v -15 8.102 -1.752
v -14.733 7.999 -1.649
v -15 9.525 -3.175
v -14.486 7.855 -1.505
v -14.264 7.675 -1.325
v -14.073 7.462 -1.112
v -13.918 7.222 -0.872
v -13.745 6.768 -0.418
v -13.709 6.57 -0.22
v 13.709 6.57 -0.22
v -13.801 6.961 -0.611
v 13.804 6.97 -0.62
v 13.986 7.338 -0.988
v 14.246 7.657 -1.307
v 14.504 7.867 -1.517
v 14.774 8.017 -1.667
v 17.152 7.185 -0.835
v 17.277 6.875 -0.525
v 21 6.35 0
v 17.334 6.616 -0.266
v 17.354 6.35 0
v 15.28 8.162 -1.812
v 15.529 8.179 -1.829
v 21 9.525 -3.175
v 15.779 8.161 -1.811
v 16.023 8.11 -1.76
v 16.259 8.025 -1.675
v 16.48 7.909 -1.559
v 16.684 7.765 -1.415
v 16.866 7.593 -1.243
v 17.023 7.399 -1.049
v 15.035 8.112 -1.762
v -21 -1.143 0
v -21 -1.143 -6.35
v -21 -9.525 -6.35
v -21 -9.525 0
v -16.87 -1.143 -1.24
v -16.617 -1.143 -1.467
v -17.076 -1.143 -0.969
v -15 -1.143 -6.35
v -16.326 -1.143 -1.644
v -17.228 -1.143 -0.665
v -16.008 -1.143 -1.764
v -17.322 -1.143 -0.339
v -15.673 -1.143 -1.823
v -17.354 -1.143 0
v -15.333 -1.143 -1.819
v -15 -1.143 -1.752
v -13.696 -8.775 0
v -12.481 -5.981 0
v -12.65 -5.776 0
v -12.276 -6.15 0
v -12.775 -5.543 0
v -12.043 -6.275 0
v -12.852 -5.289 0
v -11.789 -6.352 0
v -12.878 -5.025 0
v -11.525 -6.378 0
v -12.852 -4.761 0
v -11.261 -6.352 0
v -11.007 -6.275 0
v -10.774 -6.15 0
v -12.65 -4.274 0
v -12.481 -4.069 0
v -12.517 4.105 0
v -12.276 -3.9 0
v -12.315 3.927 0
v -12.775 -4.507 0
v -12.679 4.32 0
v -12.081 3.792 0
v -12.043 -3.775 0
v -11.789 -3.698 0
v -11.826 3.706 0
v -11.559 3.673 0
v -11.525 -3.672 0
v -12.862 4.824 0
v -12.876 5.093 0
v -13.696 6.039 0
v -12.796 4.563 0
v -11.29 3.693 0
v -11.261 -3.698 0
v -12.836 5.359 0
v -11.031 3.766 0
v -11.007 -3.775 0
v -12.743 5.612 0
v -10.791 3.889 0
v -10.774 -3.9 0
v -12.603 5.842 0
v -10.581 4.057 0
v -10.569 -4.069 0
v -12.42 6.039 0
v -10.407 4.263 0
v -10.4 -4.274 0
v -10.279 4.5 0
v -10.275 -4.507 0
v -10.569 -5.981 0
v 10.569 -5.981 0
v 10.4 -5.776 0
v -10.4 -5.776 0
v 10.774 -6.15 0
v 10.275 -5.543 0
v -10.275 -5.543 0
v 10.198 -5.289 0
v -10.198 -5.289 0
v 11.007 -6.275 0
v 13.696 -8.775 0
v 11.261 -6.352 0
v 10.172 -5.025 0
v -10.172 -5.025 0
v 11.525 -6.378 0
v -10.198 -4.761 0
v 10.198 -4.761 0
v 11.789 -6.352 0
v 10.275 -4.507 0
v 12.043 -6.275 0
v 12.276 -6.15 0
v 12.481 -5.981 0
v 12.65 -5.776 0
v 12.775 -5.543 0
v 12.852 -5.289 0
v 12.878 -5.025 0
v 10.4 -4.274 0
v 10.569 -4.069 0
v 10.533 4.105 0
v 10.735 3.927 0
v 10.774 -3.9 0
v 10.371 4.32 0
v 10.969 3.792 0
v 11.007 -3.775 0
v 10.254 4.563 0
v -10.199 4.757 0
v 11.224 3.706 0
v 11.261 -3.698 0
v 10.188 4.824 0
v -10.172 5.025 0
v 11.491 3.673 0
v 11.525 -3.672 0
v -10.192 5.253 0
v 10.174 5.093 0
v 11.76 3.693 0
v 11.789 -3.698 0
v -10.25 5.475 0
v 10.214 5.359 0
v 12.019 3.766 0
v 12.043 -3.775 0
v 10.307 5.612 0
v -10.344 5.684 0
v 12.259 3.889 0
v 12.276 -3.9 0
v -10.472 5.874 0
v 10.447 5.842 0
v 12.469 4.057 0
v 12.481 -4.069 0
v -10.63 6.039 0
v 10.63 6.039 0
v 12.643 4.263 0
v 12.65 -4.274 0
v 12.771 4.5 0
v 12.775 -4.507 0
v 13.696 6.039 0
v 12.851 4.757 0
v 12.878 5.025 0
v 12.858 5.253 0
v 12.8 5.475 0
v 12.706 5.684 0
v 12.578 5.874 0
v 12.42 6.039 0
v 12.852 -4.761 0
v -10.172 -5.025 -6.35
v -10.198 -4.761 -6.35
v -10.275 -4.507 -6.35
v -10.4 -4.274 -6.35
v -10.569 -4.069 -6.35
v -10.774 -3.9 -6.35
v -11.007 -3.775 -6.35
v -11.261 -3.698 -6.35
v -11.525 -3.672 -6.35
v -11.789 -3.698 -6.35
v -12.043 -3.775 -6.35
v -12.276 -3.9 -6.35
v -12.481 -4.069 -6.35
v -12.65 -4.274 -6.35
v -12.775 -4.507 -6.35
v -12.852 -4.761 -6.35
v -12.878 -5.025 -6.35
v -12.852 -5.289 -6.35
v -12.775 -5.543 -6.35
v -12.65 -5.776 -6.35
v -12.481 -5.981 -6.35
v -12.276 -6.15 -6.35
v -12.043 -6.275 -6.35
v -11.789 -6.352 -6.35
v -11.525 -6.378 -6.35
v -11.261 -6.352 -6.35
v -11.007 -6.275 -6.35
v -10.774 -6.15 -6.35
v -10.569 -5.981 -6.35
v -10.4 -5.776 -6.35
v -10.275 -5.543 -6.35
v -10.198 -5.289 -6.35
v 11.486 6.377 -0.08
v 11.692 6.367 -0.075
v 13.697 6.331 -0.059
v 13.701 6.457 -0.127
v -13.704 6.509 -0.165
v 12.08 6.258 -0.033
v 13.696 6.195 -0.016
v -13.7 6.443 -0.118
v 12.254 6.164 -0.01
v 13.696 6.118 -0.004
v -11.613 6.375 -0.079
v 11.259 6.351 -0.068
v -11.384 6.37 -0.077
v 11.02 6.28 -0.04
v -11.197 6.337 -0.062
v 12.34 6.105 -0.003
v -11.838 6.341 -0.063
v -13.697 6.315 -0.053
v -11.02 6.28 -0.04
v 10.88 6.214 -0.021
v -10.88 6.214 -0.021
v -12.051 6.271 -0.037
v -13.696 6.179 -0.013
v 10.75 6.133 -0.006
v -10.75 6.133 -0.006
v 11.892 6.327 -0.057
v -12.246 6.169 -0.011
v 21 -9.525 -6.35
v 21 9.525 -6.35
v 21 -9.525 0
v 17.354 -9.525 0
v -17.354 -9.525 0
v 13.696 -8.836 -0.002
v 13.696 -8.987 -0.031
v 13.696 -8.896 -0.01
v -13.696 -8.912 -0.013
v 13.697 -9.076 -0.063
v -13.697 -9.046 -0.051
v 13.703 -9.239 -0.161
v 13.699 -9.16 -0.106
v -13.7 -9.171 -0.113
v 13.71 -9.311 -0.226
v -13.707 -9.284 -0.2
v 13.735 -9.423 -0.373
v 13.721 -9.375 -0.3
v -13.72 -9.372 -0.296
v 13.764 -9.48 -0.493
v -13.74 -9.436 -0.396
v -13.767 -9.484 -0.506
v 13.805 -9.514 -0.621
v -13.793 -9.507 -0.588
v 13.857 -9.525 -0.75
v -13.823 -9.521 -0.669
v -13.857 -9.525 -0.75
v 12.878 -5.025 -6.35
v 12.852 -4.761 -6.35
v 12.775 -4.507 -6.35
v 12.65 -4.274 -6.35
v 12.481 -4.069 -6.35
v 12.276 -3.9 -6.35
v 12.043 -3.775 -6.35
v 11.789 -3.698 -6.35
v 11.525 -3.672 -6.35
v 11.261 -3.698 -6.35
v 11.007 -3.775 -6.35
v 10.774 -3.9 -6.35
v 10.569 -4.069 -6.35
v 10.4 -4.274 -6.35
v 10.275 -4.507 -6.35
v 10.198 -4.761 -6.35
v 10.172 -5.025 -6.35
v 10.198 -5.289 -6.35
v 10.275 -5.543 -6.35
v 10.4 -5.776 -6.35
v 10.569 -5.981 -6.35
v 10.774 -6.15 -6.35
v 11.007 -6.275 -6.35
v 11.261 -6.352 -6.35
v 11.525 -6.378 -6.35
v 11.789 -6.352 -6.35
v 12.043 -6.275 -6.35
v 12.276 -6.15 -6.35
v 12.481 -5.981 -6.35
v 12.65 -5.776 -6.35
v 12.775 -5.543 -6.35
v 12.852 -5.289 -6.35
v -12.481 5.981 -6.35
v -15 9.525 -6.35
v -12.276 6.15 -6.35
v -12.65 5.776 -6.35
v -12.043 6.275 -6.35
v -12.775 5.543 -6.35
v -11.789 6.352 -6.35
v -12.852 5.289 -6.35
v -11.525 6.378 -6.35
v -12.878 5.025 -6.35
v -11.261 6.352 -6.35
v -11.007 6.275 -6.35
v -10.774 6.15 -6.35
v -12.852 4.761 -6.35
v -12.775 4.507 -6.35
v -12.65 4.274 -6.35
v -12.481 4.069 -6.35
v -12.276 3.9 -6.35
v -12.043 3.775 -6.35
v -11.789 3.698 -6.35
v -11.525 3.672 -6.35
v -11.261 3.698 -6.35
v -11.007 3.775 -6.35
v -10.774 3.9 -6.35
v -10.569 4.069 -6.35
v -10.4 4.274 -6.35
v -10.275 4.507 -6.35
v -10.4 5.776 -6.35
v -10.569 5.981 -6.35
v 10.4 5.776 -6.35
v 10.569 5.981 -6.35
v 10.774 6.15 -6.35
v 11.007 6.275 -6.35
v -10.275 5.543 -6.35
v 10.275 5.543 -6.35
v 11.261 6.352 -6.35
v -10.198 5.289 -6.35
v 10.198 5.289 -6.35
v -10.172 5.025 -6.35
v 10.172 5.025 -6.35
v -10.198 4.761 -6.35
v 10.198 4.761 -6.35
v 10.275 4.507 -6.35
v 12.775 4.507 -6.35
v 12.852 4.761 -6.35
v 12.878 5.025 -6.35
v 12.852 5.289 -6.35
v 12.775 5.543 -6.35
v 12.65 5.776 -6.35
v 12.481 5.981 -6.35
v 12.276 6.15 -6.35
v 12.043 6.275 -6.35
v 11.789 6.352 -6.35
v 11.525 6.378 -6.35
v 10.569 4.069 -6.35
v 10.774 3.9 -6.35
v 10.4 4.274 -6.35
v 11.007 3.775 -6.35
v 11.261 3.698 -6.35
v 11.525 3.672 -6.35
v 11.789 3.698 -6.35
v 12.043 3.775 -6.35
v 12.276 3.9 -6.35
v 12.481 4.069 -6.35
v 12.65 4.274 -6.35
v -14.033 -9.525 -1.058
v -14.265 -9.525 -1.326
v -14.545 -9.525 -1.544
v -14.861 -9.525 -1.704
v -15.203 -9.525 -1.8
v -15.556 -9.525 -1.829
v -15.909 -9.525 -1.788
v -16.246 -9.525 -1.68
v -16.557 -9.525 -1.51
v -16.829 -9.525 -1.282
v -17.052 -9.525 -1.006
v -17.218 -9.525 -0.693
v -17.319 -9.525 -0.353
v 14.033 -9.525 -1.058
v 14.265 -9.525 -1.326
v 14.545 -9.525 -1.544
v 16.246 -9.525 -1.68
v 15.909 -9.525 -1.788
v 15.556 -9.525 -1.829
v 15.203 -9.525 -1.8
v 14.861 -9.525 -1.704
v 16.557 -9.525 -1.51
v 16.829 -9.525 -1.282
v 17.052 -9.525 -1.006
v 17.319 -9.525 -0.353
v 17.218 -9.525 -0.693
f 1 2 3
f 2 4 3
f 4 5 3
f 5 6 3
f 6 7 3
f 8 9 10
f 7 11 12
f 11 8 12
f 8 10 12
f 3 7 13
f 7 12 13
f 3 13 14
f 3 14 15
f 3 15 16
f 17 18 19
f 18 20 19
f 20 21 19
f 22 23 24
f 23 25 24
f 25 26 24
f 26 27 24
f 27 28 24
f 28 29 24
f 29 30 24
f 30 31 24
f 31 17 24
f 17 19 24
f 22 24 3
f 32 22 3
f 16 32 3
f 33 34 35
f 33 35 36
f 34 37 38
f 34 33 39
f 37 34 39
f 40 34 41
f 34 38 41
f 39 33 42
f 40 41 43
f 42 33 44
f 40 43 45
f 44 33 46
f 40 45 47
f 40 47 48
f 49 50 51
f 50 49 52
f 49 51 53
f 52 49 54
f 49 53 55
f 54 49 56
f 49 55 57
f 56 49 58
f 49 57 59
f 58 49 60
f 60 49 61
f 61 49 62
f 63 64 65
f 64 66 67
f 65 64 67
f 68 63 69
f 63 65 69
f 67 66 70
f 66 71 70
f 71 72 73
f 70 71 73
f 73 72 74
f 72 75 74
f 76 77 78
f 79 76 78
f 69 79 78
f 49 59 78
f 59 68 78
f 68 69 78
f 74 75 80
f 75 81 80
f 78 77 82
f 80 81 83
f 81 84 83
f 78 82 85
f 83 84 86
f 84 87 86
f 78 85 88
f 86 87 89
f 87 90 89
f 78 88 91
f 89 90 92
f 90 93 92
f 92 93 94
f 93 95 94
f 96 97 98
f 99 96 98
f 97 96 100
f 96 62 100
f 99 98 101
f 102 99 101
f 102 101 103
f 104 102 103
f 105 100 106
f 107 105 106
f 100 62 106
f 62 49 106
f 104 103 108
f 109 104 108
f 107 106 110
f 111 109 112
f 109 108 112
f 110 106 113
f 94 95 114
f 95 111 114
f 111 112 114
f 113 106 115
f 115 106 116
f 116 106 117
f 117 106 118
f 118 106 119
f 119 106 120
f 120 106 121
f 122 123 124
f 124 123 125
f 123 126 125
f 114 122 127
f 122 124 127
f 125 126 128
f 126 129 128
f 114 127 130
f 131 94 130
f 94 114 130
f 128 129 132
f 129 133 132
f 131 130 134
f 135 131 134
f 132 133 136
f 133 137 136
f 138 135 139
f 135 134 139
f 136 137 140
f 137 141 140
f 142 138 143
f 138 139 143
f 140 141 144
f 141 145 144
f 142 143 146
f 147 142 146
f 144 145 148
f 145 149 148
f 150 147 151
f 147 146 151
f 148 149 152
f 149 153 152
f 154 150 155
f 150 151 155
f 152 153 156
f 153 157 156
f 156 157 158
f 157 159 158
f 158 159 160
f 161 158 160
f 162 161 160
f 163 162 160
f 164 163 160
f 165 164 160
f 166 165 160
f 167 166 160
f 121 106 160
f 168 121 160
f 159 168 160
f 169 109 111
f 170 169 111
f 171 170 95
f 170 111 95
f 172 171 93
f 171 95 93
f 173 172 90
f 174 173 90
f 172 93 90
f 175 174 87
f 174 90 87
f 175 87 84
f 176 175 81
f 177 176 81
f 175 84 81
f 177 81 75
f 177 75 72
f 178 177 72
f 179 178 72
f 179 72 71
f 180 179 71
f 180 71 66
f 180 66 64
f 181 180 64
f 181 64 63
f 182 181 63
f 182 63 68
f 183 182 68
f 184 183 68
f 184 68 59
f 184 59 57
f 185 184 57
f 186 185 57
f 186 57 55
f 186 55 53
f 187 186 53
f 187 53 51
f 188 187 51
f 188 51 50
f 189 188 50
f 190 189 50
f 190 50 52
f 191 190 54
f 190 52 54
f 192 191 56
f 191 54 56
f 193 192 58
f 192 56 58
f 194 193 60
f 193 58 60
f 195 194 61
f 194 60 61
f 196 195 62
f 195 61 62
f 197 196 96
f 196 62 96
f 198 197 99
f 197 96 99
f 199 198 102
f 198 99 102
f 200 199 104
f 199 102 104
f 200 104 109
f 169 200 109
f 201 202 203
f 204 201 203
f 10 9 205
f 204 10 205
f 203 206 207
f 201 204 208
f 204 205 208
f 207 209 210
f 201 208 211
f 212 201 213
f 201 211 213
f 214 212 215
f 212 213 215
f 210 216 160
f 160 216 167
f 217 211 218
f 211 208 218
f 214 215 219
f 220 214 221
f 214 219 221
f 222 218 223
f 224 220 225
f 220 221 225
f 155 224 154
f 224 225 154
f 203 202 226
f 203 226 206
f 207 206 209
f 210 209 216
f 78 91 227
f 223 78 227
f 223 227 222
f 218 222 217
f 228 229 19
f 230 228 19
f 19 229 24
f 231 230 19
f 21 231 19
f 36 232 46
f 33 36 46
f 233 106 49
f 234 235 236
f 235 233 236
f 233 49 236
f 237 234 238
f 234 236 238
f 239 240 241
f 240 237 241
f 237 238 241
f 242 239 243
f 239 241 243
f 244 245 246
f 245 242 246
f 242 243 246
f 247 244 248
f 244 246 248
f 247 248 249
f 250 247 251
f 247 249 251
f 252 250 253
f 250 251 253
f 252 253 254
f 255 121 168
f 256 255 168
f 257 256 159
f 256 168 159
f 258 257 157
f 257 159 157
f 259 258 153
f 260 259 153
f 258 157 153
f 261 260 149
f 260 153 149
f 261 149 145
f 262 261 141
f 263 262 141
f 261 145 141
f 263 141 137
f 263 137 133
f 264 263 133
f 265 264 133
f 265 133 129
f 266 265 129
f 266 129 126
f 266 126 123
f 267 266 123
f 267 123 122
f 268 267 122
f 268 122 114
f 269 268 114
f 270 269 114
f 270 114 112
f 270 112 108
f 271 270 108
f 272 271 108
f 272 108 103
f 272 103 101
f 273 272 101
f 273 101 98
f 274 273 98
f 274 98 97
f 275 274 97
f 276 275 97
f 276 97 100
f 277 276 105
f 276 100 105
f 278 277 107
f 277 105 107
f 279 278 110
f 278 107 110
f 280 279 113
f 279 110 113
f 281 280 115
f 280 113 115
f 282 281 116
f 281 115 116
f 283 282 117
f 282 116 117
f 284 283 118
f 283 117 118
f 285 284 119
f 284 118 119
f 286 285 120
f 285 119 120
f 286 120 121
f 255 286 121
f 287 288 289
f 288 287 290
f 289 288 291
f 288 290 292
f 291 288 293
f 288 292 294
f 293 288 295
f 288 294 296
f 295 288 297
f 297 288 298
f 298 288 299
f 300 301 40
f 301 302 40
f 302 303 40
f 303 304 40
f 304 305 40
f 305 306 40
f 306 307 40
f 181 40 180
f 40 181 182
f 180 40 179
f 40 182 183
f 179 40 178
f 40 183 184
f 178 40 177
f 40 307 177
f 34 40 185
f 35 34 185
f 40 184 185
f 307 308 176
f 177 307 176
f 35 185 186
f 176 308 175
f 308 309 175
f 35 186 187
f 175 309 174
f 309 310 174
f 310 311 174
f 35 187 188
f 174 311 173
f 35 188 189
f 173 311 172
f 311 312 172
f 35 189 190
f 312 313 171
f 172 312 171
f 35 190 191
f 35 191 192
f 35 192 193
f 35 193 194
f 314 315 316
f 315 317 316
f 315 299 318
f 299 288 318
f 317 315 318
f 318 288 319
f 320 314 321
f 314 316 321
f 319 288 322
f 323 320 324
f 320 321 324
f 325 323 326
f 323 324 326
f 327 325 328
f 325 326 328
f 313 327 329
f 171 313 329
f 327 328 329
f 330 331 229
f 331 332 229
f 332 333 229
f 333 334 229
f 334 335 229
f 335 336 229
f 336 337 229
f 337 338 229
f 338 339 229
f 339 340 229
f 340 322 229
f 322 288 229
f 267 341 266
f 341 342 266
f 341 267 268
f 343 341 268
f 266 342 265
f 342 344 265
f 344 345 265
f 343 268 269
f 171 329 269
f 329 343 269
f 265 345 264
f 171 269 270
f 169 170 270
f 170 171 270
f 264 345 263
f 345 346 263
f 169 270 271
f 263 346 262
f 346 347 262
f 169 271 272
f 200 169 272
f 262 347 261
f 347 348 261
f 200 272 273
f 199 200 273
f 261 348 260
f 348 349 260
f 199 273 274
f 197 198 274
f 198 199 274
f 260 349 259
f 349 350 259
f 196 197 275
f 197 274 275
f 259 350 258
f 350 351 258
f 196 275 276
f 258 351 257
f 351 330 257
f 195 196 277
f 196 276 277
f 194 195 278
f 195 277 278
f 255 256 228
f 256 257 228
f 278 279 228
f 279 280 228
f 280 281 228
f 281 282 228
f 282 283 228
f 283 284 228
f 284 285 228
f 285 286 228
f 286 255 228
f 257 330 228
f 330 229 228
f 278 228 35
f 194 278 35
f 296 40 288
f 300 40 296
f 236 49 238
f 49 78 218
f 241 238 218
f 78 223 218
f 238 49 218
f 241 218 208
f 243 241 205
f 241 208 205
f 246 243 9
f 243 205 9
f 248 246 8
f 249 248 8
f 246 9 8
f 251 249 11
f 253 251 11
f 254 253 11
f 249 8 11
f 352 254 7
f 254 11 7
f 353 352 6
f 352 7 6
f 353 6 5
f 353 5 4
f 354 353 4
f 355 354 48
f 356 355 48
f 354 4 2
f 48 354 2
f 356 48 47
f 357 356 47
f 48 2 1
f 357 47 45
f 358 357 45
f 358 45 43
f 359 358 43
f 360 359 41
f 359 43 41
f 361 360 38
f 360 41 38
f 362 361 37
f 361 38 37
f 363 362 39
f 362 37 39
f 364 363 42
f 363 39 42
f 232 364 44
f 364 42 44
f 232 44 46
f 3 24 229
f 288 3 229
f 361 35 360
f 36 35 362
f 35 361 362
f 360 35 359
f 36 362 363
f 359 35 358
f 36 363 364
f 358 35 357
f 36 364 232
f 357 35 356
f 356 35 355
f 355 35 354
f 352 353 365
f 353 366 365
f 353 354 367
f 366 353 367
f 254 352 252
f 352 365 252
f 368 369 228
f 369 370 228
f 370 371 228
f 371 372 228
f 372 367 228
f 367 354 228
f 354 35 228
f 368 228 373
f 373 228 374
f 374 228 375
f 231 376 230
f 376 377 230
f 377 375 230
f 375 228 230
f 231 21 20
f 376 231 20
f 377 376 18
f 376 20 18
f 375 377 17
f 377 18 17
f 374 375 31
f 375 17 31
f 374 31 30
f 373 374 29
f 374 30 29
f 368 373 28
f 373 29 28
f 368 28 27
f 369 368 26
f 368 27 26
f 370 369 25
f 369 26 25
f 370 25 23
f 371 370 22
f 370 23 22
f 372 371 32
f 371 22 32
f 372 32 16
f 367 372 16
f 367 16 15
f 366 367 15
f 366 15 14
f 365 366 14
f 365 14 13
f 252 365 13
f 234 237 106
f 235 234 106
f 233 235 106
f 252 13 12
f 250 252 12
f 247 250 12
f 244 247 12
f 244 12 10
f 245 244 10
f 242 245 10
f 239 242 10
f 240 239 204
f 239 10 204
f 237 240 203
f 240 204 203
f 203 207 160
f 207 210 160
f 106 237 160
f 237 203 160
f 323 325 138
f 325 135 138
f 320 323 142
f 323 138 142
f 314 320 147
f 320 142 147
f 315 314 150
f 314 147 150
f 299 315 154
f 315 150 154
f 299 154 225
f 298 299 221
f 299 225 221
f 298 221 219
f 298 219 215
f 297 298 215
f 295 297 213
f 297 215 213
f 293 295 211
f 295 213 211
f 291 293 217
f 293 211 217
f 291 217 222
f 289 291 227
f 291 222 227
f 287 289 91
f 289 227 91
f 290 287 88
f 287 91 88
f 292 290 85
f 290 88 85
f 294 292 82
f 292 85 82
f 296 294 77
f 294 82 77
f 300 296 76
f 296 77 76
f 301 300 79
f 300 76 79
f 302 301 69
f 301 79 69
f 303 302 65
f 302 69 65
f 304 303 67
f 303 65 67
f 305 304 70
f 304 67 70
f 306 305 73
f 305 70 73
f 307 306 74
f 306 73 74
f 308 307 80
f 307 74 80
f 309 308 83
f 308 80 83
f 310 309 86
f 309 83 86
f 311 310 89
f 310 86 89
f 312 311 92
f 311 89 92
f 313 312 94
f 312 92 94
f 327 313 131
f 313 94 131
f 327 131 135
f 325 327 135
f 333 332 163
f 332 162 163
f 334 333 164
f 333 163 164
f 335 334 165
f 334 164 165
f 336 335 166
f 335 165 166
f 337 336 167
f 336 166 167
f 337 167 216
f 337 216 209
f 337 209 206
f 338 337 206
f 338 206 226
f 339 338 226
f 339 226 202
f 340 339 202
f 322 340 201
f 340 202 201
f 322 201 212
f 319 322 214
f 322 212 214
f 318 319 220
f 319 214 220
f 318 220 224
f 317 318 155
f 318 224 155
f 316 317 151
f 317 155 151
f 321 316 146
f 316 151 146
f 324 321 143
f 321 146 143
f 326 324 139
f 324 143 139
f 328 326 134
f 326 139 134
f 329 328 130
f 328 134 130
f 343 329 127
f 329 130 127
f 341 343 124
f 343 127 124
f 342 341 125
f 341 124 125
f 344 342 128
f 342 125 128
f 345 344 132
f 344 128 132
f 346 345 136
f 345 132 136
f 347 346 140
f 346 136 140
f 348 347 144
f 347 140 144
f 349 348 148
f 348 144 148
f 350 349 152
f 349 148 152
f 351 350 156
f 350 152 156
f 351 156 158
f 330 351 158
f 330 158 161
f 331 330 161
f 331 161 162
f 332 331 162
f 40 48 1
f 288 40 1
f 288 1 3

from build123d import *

# Parameters (mm, degrees)
BOSS_EXTRUDE1_DEPTH       = 21
F_6_32_TAPPED_HOLE1_D     = 2.7051
F_6_32_TAPPED_HOLE1_DEPTH = 9.398
F_6_32_TAPPED_HOLE1_TIP   = 0.81269403
F_6_CLEARANCE_HOLE1_D     = 3.6576
FILLET1_R                 = 0.75
SKETCH8_W                 = 6
SKETCH8_H                 = 10.668
CUT_EXTRUDE1_DEPTH        = 24.917527635


with BuildPart() as part:
    # Sketch1 → Boss-Extrude1 (new, symmetric)
    with BuildSketch(Plane(origin=(0, 0, 0), x_dir=(0, 0, -1), z_dir=(1, 0, 0))):
        Polygon((0, 6.35), (3.175, 9.525), (6.35, 9.525), (6.35, -9.525), (0, -9.525), align=None)
    extrude(amount=BOSS_EXTRUDE1_DEPTH, both=True)

    # #6-32 Tapped Hole1
    with Locations(Plane(origin=(0, 0, -6.35), x_dir=(-1, 0, 0), z_dir=(0, 0, -1))):
        with Locations((11.525, -5.025), (-11.525, 5.025), (-11.525, -5.025), (11.525, 5.025)):
            Hole(F_6_32_TAPPED_HOLE1_D / 2, depth=F_6_32_TAPPED_HOLE1_DEPTH)
            with Locations((0, 0, -(F_6_32_TAPPED_HOLE1_DEPTH + F_6_32_TAPPED_HOLE1_TIP / 2))):  # 118° drill point
                Cone(0, F_6_32_TAPPED_HOLE1_D / 2, F_6_32_TAPPED_HOLE1_TIP, mode=Mode.SUBTRACT)

    # #6 Clearance Hole1 (through all)
    with Locations(Plane(origin=(0, -9.525, 0), x_dir=(-1, 0, 0), z_dir=(0, -1, 0))):
        with Locations((-15.525, 0), (15.525, 0)):
            Hole(F_6_CLEARANCE_HOLE1_D / 2)

    # Fillet1
    # the kernel refuses this fillet: 0.75 mm, written as the material it takes off along each edge
    with BuildSketch(Plane(origin=(-14.472850429, 6.35, 0), x_dir=(0, 0.707106781186552, -0.7071067811865431), z_dir=(1, 0, 0)), Plane(origin=(11.019949465, 6.35, 0), x_dir=(0, 0.707106781186552, -0.7071067811865431), z_dir=(1, 0, 0))) as fillet1_piece_1:
        with BuildLine():
            CenterArc((FILLET1_R * 0.414213562373, -FILLET1_R), FILLET1_R, 90, 45)
            Line((-FILLET1_R * 0.292893218813, -FILLET1_R * 0.292893218813), (0, 0))
            Line((0, 0), (FILLET1_R * 0.414213562373, 0))
        make_face()
    extrude(amount=3.452900965, mode=Mode.SUBTRACT)
    with BuildSketch(Plane(origin=(-12.030050535, 6.35, 0), x_dir=(0, 0.707106781186552, -0.7071067811865431), z_dir=(1, 0, 0))) as fillet1_piece_2:
        with BuildLine():
            CenterArc((FILLET1_R * 0.414213562373, -FILLET1_R), FILLET1_R, 90, 45)
            Line((-FILLET1_R * 0.292893218813, -FILLET1_R * 0.292893218813), (0, 0))
            Line((0, 0), (FILLET1_R * 0.414213562373, 0))
        make_face()
    extrude(amount=24.060101071, mode=Mode.SUBTRACT)
    with BuildSketch(Plane(origin=(-15.5712, -9.525, 0), x_dir=(0, 1, 0), z_dir=(1, 0, 0))) as fillet1_piece_3:
        with BuildLine():
            CenterArc((FILLET1_R, -FILLET1_R), FILLET1_R, 90, 90)
            Line((0, -FILLET1_R), (0, 0))
            Line((0, 0), (FILLET1_R, 0))
        make_face()
    extrude(amount=31.1424, mode=Mode.SUBTRACT)

    # Sketch8 → Cut-Extrude1 (cut, through all)
    with BuildSketch(Plane.XY):
        with Locations((-18, 4.191)):
            Rectangle(SKETCH8_W, SKETCH8_H)
    extrude(amount=-CUT_EXTRUDE1_DEPTH, mode=Mode.SUBTRACT)


solid = part.part
